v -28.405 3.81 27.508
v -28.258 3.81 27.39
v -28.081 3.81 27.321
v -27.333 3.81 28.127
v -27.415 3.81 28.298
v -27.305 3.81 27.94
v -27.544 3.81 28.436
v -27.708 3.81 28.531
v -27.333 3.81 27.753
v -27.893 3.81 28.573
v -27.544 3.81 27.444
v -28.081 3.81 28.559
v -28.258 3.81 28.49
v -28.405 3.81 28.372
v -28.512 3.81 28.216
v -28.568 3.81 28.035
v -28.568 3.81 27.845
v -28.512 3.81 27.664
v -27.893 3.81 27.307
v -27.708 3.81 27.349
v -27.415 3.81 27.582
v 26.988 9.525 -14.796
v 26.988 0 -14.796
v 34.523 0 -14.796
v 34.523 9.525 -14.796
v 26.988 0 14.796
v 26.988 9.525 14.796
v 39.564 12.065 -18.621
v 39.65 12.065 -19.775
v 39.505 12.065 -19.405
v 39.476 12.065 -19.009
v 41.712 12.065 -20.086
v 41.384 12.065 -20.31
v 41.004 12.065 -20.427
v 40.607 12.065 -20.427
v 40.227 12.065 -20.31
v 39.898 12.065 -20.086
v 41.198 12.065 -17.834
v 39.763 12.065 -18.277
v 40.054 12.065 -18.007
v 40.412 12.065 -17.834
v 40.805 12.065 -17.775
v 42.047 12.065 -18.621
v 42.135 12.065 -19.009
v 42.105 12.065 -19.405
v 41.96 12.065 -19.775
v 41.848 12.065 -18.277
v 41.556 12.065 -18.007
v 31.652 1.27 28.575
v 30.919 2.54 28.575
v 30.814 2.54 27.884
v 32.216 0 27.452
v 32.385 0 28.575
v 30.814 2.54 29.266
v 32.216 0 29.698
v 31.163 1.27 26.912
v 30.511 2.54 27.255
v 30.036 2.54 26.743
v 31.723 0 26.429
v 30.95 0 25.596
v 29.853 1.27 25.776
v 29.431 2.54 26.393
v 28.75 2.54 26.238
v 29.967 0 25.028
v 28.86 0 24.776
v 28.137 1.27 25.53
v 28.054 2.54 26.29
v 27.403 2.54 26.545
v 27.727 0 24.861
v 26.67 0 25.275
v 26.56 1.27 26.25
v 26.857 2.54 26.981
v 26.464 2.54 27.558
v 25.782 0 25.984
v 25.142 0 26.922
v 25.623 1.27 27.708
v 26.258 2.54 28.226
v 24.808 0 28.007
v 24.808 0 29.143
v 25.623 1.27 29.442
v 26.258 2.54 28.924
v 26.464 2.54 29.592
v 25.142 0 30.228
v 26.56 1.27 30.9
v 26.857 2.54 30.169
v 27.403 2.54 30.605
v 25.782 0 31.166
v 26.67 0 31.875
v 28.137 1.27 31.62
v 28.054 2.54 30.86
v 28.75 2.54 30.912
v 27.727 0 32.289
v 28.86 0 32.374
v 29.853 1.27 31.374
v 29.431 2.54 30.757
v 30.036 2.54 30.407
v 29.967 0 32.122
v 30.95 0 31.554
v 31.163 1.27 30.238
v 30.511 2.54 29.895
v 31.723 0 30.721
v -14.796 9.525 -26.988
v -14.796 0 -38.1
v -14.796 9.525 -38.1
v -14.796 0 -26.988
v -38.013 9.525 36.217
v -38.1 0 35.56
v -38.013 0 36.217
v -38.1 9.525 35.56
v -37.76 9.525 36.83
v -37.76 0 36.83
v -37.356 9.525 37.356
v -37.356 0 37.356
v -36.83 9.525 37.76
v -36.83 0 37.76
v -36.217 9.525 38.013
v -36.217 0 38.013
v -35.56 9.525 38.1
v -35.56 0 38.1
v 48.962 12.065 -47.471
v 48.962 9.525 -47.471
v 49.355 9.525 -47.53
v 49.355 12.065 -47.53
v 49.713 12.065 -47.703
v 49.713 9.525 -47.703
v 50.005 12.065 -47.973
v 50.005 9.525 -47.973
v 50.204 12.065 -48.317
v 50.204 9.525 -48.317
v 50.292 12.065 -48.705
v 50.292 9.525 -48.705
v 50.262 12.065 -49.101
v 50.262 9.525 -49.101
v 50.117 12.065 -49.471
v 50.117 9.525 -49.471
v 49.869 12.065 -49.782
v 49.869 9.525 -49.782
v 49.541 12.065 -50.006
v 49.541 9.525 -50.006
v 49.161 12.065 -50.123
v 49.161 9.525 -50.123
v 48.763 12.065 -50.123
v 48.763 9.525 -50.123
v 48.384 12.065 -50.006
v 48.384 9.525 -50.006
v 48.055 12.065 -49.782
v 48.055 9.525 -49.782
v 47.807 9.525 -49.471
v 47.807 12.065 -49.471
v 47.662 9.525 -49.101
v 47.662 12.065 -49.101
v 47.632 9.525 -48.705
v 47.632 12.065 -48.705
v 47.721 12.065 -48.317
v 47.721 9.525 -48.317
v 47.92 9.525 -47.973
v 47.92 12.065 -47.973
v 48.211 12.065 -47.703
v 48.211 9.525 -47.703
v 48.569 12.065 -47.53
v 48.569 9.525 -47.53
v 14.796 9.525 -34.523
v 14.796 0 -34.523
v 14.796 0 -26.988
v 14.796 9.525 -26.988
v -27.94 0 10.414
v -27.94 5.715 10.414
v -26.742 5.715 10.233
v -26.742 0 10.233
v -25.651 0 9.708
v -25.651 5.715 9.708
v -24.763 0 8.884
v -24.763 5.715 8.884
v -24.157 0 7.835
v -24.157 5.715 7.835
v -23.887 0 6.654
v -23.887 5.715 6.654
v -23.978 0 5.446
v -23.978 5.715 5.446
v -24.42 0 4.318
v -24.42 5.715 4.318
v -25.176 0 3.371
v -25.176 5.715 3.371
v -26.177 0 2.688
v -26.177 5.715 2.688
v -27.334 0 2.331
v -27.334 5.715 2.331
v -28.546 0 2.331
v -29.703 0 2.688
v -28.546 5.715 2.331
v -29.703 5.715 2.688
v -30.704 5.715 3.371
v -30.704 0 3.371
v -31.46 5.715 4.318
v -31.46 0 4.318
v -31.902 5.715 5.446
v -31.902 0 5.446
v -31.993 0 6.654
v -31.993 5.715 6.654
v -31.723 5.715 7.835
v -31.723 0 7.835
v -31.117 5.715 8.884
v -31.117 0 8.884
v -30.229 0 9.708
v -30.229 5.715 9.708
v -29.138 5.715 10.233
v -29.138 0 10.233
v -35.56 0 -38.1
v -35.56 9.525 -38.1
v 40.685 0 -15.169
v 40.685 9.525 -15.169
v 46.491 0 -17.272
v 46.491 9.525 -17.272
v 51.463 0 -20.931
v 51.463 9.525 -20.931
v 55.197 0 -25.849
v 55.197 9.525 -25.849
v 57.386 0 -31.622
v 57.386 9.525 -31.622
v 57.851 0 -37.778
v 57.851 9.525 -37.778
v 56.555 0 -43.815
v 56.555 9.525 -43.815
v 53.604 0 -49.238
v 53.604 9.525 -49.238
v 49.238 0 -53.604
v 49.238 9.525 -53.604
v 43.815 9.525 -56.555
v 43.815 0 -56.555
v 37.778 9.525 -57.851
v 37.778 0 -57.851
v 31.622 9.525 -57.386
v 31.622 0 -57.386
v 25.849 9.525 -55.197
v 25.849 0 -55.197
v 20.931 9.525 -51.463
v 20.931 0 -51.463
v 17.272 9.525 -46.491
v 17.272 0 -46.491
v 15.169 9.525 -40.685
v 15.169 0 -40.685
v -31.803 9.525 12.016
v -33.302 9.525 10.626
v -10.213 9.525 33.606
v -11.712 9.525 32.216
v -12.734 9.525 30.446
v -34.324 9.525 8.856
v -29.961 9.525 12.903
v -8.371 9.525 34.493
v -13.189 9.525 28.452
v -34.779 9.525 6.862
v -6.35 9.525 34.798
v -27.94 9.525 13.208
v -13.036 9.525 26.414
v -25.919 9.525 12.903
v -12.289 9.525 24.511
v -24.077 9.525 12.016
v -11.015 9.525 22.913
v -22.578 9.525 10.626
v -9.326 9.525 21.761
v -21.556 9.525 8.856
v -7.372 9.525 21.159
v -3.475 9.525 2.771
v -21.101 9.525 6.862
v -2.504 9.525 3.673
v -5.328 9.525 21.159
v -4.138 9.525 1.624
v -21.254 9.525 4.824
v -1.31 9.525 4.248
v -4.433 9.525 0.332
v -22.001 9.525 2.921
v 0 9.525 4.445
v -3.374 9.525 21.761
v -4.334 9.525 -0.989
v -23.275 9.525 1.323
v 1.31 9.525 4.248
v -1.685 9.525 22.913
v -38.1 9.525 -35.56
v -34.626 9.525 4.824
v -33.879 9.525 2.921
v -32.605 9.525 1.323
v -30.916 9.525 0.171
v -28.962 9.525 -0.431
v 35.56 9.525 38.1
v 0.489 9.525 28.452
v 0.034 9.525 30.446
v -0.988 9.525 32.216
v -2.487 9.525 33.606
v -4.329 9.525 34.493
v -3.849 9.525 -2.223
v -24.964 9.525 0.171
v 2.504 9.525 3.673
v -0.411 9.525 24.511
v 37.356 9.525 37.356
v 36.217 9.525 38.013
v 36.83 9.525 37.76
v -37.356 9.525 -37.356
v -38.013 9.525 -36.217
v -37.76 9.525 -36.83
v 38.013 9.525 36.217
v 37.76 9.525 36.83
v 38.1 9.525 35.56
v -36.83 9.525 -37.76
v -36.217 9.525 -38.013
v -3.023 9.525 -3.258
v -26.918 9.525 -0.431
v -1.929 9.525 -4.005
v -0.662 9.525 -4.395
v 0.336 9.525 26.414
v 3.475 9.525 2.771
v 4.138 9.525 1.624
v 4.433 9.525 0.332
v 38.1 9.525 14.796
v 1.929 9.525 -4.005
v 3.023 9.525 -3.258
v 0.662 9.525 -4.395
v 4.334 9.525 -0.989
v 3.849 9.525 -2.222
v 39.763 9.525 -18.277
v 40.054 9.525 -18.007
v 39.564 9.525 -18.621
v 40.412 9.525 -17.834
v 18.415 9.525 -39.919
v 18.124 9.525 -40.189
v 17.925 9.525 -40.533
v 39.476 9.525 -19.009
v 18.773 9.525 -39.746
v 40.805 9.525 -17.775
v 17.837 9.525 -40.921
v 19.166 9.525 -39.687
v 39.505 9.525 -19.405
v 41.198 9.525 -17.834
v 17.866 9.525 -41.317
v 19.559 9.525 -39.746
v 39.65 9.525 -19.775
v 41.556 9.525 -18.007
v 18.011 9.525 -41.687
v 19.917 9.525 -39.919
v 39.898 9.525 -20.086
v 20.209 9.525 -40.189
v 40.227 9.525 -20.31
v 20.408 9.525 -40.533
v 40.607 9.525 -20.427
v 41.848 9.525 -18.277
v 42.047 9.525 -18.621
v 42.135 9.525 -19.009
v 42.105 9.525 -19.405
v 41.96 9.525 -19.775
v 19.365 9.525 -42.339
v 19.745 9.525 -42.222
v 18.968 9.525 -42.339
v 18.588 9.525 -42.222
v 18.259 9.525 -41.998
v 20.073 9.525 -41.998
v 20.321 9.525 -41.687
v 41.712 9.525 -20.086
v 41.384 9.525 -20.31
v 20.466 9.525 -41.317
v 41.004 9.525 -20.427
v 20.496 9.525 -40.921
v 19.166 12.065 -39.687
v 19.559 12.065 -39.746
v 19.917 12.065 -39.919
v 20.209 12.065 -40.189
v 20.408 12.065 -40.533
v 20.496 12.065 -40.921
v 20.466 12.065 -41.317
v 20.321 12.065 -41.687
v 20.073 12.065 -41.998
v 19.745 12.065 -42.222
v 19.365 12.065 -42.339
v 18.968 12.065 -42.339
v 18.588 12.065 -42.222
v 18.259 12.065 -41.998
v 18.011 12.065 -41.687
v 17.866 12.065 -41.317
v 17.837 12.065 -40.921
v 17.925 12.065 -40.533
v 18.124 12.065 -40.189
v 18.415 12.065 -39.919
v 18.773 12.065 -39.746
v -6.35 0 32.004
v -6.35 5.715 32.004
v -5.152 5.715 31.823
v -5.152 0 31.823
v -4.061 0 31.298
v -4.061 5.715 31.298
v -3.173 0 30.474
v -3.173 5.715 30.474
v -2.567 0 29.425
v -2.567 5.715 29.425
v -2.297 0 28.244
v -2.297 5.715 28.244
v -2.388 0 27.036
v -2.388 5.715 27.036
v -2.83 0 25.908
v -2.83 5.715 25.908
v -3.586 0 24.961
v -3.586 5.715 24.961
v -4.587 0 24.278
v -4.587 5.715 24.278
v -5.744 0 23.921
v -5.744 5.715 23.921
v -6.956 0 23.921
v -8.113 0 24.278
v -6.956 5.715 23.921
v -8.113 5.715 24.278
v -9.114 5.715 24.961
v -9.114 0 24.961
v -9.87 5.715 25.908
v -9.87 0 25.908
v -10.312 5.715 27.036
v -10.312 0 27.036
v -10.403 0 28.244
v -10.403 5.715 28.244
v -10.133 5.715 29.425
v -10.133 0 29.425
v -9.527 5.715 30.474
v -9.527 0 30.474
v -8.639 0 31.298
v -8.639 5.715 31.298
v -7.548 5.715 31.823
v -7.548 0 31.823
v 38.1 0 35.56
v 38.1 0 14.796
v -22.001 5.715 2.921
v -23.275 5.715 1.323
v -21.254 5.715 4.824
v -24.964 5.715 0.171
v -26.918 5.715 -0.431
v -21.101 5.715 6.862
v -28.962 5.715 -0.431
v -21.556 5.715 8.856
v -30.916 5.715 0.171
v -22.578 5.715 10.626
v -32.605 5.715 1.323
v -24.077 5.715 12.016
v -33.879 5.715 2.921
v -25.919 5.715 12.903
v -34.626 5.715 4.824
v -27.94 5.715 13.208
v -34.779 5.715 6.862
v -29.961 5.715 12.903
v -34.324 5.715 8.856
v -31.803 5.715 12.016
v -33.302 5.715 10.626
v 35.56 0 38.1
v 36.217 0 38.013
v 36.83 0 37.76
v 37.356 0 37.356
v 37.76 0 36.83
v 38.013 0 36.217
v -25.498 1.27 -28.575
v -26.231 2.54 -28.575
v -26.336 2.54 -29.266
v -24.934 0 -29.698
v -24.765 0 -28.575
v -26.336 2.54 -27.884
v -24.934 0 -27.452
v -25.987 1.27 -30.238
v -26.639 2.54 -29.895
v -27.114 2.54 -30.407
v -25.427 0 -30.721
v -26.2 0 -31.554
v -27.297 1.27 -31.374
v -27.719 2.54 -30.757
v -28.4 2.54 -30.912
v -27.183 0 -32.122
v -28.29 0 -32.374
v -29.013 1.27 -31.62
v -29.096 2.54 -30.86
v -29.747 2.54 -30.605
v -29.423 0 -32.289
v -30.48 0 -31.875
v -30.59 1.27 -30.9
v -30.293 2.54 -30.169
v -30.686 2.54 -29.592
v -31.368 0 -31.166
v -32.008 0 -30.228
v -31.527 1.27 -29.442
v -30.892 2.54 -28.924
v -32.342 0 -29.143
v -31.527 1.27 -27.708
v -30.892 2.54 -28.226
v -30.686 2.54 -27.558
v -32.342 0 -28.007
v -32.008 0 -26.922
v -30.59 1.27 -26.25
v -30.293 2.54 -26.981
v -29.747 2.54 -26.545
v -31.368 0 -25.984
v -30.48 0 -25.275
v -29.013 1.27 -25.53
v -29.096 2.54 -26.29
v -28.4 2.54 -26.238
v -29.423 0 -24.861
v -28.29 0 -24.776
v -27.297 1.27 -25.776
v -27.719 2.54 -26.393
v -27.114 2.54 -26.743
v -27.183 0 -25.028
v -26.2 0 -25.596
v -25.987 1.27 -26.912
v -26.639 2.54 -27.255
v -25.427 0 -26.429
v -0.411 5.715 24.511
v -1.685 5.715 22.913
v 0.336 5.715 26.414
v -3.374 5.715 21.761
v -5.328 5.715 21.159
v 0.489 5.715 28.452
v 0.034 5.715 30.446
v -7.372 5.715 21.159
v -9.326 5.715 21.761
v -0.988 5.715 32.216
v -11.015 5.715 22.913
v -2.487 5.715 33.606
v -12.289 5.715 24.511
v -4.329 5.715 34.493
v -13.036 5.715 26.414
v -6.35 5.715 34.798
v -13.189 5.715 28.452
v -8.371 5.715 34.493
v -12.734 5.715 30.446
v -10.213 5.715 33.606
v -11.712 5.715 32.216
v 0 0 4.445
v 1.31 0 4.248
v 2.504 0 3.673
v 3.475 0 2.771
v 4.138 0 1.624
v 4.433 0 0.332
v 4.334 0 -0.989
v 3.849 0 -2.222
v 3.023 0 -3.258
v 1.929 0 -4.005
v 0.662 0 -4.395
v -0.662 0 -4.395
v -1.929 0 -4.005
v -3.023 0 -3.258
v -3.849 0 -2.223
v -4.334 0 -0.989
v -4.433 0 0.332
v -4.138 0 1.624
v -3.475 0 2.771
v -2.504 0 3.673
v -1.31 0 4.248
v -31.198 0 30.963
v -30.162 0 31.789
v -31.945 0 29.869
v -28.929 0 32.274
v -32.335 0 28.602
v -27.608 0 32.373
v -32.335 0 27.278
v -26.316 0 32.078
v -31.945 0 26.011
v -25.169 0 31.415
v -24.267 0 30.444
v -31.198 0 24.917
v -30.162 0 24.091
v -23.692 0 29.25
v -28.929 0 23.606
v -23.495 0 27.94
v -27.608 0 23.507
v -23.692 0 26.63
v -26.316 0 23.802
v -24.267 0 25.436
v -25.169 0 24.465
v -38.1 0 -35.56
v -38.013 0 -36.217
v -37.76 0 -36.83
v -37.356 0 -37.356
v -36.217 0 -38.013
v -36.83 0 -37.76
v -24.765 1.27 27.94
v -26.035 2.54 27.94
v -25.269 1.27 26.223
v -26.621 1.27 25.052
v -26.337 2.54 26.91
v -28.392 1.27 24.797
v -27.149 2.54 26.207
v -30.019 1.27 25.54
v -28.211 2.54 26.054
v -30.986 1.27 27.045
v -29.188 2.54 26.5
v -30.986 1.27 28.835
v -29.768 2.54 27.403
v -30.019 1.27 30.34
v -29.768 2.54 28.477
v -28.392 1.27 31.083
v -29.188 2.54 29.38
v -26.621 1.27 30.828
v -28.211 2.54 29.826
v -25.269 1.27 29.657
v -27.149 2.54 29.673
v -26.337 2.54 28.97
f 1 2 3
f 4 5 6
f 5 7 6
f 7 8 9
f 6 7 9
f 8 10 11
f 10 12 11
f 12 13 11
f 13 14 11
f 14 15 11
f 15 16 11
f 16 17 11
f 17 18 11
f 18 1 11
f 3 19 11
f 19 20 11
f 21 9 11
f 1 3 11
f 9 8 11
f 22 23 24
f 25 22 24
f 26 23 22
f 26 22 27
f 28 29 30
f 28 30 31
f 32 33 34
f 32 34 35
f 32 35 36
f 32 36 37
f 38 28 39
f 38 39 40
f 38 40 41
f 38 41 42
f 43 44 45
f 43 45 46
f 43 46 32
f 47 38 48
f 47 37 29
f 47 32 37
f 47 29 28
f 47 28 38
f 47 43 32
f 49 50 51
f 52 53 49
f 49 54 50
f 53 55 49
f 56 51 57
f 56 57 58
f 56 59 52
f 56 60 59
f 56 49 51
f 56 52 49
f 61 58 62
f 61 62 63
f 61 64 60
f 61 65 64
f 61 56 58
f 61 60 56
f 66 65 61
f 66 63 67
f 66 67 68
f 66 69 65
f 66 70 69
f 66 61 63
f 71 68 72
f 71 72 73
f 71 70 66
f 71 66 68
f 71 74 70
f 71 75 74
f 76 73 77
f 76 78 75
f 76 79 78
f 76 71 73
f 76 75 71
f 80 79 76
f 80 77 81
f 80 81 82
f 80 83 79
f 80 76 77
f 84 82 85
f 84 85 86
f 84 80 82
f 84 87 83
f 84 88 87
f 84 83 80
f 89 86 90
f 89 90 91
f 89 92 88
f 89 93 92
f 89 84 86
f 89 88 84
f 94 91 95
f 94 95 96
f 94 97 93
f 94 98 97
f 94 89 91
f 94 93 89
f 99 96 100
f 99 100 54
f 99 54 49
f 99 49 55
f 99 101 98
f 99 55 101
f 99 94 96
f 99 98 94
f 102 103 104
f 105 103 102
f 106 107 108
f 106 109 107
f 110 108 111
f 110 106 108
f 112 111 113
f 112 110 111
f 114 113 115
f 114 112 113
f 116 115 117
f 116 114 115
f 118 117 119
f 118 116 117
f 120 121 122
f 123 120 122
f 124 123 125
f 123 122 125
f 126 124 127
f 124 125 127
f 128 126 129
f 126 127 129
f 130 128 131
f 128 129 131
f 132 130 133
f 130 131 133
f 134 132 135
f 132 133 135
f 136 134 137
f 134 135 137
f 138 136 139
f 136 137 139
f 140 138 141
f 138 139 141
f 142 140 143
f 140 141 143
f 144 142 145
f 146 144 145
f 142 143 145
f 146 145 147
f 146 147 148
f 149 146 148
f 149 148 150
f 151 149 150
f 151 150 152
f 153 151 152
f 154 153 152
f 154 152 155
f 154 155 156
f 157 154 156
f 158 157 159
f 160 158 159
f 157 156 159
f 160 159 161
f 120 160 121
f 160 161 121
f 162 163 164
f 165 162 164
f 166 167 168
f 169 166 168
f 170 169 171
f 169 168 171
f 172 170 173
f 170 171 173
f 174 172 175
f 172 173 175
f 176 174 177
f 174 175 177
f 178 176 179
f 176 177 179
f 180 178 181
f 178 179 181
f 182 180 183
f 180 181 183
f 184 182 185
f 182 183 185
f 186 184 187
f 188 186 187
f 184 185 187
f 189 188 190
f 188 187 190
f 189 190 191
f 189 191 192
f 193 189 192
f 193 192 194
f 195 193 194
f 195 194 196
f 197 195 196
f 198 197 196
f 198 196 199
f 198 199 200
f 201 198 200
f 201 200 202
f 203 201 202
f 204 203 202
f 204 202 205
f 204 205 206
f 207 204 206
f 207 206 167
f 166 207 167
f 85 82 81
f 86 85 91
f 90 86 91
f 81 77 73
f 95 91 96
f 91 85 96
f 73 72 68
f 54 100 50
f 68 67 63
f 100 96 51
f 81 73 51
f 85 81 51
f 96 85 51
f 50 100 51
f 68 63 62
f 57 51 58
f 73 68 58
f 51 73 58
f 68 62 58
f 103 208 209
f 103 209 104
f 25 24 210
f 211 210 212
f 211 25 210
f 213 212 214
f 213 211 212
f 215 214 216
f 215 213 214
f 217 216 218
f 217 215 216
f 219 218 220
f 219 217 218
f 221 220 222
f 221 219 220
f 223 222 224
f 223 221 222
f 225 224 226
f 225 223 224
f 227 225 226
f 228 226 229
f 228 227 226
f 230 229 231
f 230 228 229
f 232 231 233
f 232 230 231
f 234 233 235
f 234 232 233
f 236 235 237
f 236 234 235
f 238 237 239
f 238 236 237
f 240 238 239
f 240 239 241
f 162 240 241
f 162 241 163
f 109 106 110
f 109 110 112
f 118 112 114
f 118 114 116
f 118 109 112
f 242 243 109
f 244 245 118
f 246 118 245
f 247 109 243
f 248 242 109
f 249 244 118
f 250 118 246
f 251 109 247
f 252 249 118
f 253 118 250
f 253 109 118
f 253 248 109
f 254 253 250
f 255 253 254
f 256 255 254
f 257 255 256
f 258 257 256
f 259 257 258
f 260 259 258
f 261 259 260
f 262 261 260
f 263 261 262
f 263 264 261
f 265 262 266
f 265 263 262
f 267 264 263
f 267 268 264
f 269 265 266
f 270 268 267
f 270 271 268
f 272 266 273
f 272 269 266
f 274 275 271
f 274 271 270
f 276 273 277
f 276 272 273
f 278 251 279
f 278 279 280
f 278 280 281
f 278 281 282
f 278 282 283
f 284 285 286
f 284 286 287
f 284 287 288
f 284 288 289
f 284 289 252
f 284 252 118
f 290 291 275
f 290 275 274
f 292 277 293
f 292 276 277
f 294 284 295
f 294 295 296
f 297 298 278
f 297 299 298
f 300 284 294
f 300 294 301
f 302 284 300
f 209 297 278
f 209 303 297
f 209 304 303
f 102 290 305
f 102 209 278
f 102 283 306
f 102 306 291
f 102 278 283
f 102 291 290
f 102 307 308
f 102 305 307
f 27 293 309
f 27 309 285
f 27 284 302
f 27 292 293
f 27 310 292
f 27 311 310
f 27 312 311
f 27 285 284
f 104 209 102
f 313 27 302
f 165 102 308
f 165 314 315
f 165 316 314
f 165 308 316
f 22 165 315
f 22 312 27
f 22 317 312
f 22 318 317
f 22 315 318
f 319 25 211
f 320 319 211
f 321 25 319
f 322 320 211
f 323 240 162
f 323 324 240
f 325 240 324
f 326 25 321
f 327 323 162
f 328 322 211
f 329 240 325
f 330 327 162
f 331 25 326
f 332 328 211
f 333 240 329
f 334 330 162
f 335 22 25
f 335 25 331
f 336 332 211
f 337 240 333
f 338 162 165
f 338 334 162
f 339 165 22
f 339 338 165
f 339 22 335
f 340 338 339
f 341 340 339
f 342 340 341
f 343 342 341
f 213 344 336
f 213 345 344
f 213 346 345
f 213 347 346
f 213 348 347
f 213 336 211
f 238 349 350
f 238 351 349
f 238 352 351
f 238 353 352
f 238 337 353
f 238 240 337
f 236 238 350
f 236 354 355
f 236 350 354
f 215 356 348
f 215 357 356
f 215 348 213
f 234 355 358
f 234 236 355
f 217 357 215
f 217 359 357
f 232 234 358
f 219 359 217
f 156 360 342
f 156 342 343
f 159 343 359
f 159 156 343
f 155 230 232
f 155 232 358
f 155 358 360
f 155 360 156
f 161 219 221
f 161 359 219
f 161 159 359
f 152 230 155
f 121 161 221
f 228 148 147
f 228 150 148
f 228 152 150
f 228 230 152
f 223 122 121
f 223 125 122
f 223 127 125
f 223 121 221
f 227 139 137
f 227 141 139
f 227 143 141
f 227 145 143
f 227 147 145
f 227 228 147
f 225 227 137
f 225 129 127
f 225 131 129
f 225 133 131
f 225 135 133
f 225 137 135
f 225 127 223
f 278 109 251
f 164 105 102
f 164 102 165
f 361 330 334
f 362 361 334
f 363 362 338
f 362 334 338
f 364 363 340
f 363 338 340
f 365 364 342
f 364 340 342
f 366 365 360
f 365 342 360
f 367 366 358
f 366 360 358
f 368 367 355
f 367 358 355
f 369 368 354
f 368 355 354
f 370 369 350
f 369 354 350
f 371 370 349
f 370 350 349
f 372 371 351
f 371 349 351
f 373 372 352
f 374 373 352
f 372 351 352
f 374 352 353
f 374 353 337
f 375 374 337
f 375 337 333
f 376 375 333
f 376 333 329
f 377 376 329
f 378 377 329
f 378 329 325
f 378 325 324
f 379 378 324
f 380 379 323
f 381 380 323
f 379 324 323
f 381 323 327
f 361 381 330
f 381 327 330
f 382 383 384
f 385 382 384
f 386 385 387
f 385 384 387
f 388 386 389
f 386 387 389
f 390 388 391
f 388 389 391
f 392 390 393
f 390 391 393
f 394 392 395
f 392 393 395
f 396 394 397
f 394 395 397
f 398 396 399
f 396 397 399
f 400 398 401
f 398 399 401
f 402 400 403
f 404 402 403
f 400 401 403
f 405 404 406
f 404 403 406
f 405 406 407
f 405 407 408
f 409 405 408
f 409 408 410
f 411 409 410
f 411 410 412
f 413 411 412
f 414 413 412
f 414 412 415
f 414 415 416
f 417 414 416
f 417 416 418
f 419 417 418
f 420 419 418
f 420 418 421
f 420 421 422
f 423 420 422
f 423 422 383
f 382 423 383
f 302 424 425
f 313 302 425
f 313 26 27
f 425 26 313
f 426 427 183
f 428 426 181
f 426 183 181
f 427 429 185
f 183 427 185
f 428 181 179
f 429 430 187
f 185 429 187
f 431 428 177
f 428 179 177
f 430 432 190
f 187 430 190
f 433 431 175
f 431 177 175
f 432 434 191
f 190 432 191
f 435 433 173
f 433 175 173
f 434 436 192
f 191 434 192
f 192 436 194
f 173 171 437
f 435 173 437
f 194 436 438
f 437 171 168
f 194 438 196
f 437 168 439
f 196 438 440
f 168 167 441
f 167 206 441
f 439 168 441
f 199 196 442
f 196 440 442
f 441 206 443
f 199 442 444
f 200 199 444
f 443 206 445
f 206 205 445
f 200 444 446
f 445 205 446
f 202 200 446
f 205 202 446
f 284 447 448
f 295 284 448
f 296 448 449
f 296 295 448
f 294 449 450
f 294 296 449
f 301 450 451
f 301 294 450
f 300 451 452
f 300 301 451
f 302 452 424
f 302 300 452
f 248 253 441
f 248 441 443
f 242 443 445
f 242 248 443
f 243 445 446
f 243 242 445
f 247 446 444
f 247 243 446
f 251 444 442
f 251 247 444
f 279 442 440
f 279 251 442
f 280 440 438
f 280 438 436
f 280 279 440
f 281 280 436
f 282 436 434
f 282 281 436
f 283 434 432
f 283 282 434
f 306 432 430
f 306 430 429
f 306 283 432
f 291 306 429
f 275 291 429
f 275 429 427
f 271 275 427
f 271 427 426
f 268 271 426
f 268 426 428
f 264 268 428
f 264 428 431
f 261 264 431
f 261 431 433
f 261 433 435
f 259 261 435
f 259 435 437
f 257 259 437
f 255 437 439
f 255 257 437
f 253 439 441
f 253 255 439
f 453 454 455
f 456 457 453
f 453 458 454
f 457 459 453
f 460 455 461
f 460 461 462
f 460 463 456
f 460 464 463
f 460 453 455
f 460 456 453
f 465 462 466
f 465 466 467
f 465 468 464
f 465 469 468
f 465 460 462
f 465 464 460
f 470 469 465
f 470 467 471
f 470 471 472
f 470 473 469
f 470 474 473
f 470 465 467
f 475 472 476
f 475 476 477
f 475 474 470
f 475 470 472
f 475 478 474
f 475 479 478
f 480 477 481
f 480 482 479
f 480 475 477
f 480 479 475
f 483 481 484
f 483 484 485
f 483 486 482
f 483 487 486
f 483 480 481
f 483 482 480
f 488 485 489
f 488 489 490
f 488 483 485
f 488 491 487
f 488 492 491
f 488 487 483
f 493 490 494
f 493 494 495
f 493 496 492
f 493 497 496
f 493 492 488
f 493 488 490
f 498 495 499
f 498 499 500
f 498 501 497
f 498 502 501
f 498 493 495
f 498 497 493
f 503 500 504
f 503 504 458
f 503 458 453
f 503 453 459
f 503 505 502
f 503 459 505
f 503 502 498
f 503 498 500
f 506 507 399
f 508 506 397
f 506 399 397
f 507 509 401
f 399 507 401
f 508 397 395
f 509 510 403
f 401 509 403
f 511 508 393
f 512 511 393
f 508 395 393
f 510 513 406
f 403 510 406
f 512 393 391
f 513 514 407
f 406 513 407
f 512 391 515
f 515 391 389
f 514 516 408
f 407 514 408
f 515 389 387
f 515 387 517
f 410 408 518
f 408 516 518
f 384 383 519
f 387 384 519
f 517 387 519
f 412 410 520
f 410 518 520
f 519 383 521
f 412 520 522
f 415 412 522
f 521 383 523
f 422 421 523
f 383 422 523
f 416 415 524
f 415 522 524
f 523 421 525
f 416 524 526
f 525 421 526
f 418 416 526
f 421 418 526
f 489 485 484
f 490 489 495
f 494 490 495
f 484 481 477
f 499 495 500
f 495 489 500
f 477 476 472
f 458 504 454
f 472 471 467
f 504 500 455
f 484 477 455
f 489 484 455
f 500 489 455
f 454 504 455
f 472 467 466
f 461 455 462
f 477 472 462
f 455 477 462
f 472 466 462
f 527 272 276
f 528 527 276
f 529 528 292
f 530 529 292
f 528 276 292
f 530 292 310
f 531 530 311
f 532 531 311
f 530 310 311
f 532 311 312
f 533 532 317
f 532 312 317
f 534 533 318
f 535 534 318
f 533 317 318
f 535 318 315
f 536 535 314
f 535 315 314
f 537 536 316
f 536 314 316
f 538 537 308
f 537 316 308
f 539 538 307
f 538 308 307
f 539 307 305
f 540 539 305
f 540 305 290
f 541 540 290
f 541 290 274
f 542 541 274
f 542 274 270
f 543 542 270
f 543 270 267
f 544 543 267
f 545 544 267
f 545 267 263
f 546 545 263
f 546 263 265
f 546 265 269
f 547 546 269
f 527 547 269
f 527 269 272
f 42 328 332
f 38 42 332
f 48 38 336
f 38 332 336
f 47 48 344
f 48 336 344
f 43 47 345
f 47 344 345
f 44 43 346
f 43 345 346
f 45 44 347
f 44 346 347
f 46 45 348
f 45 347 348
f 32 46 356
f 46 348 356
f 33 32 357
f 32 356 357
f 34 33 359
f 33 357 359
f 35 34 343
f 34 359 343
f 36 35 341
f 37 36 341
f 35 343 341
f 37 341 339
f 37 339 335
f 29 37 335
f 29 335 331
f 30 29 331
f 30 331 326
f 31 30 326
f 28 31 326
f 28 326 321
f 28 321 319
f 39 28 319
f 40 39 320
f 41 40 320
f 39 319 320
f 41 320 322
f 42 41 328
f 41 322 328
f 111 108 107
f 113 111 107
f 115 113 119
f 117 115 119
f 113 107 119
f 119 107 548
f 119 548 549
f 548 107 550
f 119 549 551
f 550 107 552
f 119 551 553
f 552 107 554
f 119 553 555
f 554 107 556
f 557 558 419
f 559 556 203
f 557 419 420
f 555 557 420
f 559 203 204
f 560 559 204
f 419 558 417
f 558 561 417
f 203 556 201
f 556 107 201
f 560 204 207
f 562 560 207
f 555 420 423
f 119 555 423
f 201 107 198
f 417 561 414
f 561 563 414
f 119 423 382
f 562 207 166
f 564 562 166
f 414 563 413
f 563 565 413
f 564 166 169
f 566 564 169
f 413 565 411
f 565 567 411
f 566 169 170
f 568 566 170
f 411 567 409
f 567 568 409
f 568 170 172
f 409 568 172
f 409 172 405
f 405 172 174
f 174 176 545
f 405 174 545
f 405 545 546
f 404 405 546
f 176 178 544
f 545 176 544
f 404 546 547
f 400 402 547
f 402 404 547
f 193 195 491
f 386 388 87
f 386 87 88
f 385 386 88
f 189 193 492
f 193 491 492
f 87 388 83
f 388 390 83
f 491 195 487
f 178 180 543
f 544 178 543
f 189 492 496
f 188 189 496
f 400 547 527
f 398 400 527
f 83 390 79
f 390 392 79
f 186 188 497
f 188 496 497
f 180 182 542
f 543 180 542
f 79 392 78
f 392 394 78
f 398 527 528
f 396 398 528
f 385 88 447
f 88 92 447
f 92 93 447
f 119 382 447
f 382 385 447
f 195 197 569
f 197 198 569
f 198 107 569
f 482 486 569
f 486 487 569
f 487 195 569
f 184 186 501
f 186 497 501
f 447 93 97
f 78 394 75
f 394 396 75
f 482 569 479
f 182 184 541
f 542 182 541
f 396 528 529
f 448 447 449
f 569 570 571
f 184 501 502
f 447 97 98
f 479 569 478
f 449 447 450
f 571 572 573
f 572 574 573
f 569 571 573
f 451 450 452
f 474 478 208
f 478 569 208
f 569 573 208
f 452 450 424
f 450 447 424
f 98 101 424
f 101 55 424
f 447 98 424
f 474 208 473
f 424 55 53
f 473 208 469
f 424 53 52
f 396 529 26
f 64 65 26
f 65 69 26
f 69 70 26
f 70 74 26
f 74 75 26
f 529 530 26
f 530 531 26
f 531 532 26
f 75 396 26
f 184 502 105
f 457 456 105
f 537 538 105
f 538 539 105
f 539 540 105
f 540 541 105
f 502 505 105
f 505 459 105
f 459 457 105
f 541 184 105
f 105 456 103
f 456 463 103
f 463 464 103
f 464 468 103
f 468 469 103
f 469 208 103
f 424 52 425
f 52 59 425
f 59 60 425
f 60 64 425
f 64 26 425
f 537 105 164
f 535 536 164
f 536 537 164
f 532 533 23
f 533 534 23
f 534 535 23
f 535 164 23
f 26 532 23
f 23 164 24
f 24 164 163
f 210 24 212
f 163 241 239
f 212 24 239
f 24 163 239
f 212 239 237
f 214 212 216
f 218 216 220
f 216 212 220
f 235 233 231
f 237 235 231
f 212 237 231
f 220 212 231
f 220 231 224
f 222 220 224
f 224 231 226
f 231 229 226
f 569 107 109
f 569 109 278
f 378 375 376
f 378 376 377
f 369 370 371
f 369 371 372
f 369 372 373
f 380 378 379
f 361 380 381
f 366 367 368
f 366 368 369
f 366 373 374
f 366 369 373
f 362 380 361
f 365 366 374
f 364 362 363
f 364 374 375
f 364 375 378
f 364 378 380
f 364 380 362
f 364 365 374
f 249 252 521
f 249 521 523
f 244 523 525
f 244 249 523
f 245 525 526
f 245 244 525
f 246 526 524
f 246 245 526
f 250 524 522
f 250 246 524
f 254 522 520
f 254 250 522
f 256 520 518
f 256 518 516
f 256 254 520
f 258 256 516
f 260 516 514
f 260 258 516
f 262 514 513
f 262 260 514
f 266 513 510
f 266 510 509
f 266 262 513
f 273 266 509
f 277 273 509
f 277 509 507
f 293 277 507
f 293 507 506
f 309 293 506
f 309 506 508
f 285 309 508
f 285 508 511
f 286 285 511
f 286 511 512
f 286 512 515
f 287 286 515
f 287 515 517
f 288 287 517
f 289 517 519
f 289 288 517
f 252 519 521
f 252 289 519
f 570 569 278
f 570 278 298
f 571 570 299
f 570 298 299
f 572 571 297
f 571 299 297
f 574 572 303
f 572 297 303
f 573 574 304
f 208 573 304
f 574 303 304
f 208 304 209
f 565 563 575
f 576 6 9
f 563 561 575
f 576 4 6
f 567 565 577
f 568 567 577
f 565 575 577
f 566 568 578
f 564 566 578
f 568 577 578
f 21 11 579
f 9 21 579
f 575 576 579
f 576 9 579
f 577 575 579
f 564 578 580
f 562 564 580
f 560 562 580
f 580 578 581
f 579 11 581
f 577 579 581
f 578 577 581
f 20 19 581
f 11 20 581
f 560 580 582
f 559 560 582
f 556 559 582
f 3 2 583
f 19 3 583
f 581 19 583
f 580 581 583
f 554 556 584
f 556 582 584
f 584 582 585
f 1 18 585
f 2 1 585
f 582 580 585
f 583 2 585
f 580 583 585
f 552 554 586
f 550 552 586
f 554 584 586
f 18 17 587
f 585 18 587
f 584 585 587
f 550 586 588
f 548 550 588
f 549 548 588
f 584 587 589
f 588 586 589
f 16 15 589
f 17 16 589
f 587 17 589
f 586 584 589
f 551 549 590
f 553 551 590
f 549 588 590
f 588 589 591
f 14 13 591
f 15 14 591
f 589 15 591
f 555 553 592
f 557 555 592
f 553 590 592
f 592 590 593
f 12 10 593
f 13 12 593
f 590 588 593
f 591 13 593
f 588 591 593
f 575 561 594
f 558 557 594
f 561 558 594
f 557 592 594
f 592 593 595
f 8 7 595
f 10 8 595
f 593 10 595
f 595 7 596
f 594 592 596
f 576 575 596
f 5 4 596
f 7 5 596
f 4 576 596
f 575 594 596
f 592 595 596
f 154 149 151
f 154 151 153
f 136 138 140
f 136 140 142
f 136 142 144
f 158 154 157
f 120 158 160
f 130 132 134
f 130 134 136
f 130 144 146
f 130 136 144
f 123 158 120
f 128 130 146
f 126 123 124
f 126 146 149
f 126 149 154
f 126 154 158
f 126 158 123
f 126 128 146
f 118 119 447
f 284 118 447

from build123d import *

# Parameters (mm, degrees)
SKETCH1_W                    = 76.2
SKETCH1_H                    = 76.2
BOSS_EXTRUDE1_DEPTH          = 9.525
SKETCH6_R                    = 3.81
CUT_EXTRUDE2_DEPTH           = 2.54
CUT_EXTRUDE2_DRAFT           = 30
CUT_EXTRUDE2_PROFILE_2_DEPTH = 2.54
CUT_EXTRUDE2_PROFILE_2_DRAFT = 30
CUT_EXTRUDE4_REACH           = 56.717
SKETCH12_R                   = 4.064
SKETCH13_R                   = 6.858
CUT_EXTRUDE7_DEPTH           = 3.81
SKETCH7_R                    = 4.445
CUT_EXTRUDE8_DEPTH           = 3.81
CUT_EXTRUDE8_TAPER           = 45
CUT_EXTRUDE9_REACH           = 56.717
SKETCH15_R                   = 4.445
FILLET1_R                    = 2.54
CUT_EXTRUDE10_REACH          = 56.717
SKETCH16_W                   = 29.591
SKETCH16_H                   = 11.1125
SKETCH16_W_2                 = 11.1125
SKETCH16_H_2                 = 29.591
SKETCH17_R                   = 21.59
BOSS_EXTRUDE2_DEPTH          = 9.525
SKETCH18_R                   = 1.3335
BOSS_EXTRUDE3_DEPTH          = 2.54


with BuildPart() as part:
    # Sketch1 → Boss-Extrude1 (new body)
    with BuildSketch(Plane(origin=(0, 0, 0), x_dir=(1, 0, 0), z_dir=(0, 1, 0))):
        Rectangle(SKETCH1_W, SKETCH1_H)
    extrude(amount=BOSS_EXTRUDE1_DEPTH)


with BuildPart() as cut_extrude2_tool:
    # Sketch6 → Cut-Extrude2 (with draft: the straight prism first)
    with BuildSketch(Plane(origin=(0, 0, 0), x_dir=(1, 0, 0), z_dir=(0, 1, 0))):
        with Locations((-28.575, 28.575)):
            Circle(SKETCH6_R)
    extrude(amount=CUT_EXTRUDE2_DEPTH)
    # Cut-Extrude2: the draft: its side faces are tilted about the plane it starts from
    cut_extrude2_sides = [cut_extrude2_tool.faces().sort_by_distance(p)[0] for p in [
        (-32.385, 1.27, -28.575),
    ]]
    draft(cut_extrude2_sides, Plane(origin=(0, 0, 0), x_dir=(1, 0, 0), z_dir=(0, 1, 0)), CUT_EXTRUDE2_DRAFT)


with BuildPart() as part_1:
    add(part.part)

    # Cut-Extrude2: cut by cut_extrude2_tool
    add(cut_extrude2_tool.part, mode=Mode.SUBTRACT)


with BuildPart() as cut_extrude2_profile_2_tool:
    # Sketch6 → Cut-Extrude2 profile 2 (with draft: the straight prism first)
    with BuildSketch(Plane(origin=(0, 0, 0), x_dir=(1, 0, 0), z_dir=(0, 1, 0))):
        with Locations((28.575, -28.575)):
            Circle(SKETCH6_R)
    extrude(amount=CUT_EXTRUDE2_PROFILE_2_DEPTH)
    # Cut-Extrude2 profile 2: the draft: its side faces are tilted about the plane it starts from
    cut_extrude2_profile_2_sides = [cut_extrude2_profile_2_tool.faces().sort_by_distance(p)[0] for p in [
        (24.765, 1.27, 28.575),
    ]]
    draft(cut_extrude2_profile_2_sides, Plane(origin=(0, 0, 0), x_dir=(1, 0, 0), z_dir=(0, 1, 0)), CUT_EXTRUDE2_PROFILE_2_DRAFT)


with BuildPart() as part_2:
    add(part_1.part)

    # Cut-Extrude2 profile 2: cut by cut_extrude2_profile_2_tool
    add(cut_extrude2_profile_2_tool.part, mode=Mode.SUBTRACT)

    # Sketch12 → Cut-Extrude4 (cut, up to next)
    with BuildSketch(Plane(origin=(0, 9.525, 0), x_dir=(1, 0, 0), z_dir=(0, 1, 0)), mode=Mode.PRIVATE) as cut_extrude4_sk1:
        with Locations(Location((-27.94, -6.35, 0), (0, 0, 270))):
            Circle(SKETCH12_R)
    cut_extrude4_tool1 = extrude(cut_extrude4_sk1.sketch, amount=-CUT_EXTRUDE4_REACH, mode=Mode.PRIVATE) & part_2.part
    # Sketch12 → Cut-Extrude4 (cut, up to next)
    with BuildSketch(Plane(origin=(0, 9.525, 0), x_dir=(1, 0, 0), z_dir=(0, 1, 0)), mode=Mode.PRIVATE) as cut_extrude4_sk2:
        with Locations(Location((-6.35, -27.94, 0), (0, 0, 270))):
            Circle(SKETCH12_R)
    cut_extrude4_tool2 = extrude(cut_extrude4_sk2.sketch, amount=-CUT_EXTRUDE4_REACH, mode=Mode.PRIVATE) & part_2.part
    add(cut_extrude4_tool1.solids().sort_by_distance((-27.94, 9.525, 6.35))[0], mode=Mode.SUBTRACT)
    add(cut_extrude4_tool2.solids().sort_by_distance((-6.35, 9.525, 27.94))[0], mode=Mode.SUBTRACT)

    # Sketch13 → Cut-Extrude7 (cut)
    with BuildSketch(Plane.XZ.offset(-9.525)):
        with Locations(Location((-27.94, 6.35, 0), (0, 0, 90))):
            Circle(SKETCH13_R)
        with Locations(Location((-6.35, 27.94, 0), (0, 0, 90))):
            Circle(SKETCH13_R)
    extrude(amount=CUT_EXTRUDE7_DEPTH, mode=Mode.SUBTRACT)

    # Sketch7 → Cut-Extrude8 (cut)
    with BuildSketch(Plane(origin=(0, 0, 0), x_dir=(1, 0, 0), z_dir=(0, 1, 0))):
        with Locations((-27.94, -27.94)):
            Circle(SKETCH7_R)
    extrude(amount=CUT_EXTRUDE8_DEPTH, taper=CUT_EXTRUDE8_TAPER, mode=Mode.SUBTRACT)

    # Sketch15 → Cut-Extrude9 (cut, up to next)
    with BuildSketch(Plane(origin=(0, 9.525, 0), x_dir=(1, 0, 0), z_dir=(0, 1, 0)), mode=Mode.PRIVATE) as cut_extrude9_sk1:
        with Locations(Location((0, 0, 0), (0, 0, 270))):
            Circle(SKETCH15_R)
    cut_extrude9_tool1 = extrude(cut_extrude9_sk1.sketch, amount=-CUT_EXTRUDE9_REACH, mode=Mode.PRIVATE) & part_2.part
    add(cut_extrude9_tool1.solids().sort_by_distance((0, 9.525, 0))[0], mode=Mode.SUBTRACT)

    # Fillet1
    fillet1_edges = [part_2.edges().sort_by_distance(p)[0] for p in [
        (38.1, 4.7625, 38.1),
        (-38.1, 4.7625, 38.1),
        (-38.1, 4.7625, -38.1),
        (38.1, 4.7625, -38.1),
    ]]
    fillet(fillet1_edges, radius=FILLET1_R)

    # Sketch16 → Cut-Extrude10 (cut, up to next)
    with BuildSketch(Plane.XZ, mode=Mode.PRIVATE) as cut_extrude10_sk1:
        with Locations((0, -32.54375)):
            Rectangle(SKETCH16_W, SKETCH16_H)
    cut_extrude10_tool1 = extrude(cut_extrude10_sk1.sketch, amount=-CUT_EXTRUDE10_REACH, mode=Mode.PRIVATE) & part_2.part
    # Sketch16 → Cut-Extrude10 (cut, up to next)
    with BuildSketch(Plane.XZ, mode=Mode.PRIVATE) as cut_extrude10_sk2:
        with Locations((32.54375, 0)):
            Rectangle(SKETCH16_W_2, SKETCH16_H_2)
    cut_extrude10_tool2 = extrude(cut_extrude10_sk2.sketch, amount=-CUT_EXTRUDE10_REACH, mode=Mode.PRIVATE) & part_2.part
    add(cut_extrude10_tool1.solids().sort_by_distance((0, 0, -32.54375))[0], mode=Mode.SUBTRACT)
    add(cut_extrude10_tool2.solids().sort_by_distance((32.54375, 0, 0))[0], mode=Mode.SUBTRACT)

    # Sketch17 → Boss-Extrude2 (add)
    with BuildSketch(Plane(origin=(0, 9.525, 0), x_dir=(1, 0, 0), z_dir=(0, 1, 0))):
        with Locations((36.311274722, 36.311274722)):
            Circle(SKETCH17_R)
    extrude(amount=-BOSS_EXTRUDE2_DEPTH)

    # Sketch18 → Boss-Extrude3 (add)
    with BuildSketch(Plane(origin=(0, 9.525, 0), x_dir=(1, 0, 0), z_dir=(0, 1, 0))):
        with Locations(Location((19.166305808, 41.020673934, 0), (0, 0, 270))):
            Circle(SKETCH18_R)
        with Locations(Location((48.962218533, 48.804553742, 0), (0, 0, 270))):
            Circle(SKETCH18_R)
        with Locations(Location((40.805299824, 19.108596489, 0), (0, 0, 270))):
            Circle(SKETCH18_R)
    extrude(amount=BOSS_EXTRUDE3_DEPTH)


solid = part_2.part
